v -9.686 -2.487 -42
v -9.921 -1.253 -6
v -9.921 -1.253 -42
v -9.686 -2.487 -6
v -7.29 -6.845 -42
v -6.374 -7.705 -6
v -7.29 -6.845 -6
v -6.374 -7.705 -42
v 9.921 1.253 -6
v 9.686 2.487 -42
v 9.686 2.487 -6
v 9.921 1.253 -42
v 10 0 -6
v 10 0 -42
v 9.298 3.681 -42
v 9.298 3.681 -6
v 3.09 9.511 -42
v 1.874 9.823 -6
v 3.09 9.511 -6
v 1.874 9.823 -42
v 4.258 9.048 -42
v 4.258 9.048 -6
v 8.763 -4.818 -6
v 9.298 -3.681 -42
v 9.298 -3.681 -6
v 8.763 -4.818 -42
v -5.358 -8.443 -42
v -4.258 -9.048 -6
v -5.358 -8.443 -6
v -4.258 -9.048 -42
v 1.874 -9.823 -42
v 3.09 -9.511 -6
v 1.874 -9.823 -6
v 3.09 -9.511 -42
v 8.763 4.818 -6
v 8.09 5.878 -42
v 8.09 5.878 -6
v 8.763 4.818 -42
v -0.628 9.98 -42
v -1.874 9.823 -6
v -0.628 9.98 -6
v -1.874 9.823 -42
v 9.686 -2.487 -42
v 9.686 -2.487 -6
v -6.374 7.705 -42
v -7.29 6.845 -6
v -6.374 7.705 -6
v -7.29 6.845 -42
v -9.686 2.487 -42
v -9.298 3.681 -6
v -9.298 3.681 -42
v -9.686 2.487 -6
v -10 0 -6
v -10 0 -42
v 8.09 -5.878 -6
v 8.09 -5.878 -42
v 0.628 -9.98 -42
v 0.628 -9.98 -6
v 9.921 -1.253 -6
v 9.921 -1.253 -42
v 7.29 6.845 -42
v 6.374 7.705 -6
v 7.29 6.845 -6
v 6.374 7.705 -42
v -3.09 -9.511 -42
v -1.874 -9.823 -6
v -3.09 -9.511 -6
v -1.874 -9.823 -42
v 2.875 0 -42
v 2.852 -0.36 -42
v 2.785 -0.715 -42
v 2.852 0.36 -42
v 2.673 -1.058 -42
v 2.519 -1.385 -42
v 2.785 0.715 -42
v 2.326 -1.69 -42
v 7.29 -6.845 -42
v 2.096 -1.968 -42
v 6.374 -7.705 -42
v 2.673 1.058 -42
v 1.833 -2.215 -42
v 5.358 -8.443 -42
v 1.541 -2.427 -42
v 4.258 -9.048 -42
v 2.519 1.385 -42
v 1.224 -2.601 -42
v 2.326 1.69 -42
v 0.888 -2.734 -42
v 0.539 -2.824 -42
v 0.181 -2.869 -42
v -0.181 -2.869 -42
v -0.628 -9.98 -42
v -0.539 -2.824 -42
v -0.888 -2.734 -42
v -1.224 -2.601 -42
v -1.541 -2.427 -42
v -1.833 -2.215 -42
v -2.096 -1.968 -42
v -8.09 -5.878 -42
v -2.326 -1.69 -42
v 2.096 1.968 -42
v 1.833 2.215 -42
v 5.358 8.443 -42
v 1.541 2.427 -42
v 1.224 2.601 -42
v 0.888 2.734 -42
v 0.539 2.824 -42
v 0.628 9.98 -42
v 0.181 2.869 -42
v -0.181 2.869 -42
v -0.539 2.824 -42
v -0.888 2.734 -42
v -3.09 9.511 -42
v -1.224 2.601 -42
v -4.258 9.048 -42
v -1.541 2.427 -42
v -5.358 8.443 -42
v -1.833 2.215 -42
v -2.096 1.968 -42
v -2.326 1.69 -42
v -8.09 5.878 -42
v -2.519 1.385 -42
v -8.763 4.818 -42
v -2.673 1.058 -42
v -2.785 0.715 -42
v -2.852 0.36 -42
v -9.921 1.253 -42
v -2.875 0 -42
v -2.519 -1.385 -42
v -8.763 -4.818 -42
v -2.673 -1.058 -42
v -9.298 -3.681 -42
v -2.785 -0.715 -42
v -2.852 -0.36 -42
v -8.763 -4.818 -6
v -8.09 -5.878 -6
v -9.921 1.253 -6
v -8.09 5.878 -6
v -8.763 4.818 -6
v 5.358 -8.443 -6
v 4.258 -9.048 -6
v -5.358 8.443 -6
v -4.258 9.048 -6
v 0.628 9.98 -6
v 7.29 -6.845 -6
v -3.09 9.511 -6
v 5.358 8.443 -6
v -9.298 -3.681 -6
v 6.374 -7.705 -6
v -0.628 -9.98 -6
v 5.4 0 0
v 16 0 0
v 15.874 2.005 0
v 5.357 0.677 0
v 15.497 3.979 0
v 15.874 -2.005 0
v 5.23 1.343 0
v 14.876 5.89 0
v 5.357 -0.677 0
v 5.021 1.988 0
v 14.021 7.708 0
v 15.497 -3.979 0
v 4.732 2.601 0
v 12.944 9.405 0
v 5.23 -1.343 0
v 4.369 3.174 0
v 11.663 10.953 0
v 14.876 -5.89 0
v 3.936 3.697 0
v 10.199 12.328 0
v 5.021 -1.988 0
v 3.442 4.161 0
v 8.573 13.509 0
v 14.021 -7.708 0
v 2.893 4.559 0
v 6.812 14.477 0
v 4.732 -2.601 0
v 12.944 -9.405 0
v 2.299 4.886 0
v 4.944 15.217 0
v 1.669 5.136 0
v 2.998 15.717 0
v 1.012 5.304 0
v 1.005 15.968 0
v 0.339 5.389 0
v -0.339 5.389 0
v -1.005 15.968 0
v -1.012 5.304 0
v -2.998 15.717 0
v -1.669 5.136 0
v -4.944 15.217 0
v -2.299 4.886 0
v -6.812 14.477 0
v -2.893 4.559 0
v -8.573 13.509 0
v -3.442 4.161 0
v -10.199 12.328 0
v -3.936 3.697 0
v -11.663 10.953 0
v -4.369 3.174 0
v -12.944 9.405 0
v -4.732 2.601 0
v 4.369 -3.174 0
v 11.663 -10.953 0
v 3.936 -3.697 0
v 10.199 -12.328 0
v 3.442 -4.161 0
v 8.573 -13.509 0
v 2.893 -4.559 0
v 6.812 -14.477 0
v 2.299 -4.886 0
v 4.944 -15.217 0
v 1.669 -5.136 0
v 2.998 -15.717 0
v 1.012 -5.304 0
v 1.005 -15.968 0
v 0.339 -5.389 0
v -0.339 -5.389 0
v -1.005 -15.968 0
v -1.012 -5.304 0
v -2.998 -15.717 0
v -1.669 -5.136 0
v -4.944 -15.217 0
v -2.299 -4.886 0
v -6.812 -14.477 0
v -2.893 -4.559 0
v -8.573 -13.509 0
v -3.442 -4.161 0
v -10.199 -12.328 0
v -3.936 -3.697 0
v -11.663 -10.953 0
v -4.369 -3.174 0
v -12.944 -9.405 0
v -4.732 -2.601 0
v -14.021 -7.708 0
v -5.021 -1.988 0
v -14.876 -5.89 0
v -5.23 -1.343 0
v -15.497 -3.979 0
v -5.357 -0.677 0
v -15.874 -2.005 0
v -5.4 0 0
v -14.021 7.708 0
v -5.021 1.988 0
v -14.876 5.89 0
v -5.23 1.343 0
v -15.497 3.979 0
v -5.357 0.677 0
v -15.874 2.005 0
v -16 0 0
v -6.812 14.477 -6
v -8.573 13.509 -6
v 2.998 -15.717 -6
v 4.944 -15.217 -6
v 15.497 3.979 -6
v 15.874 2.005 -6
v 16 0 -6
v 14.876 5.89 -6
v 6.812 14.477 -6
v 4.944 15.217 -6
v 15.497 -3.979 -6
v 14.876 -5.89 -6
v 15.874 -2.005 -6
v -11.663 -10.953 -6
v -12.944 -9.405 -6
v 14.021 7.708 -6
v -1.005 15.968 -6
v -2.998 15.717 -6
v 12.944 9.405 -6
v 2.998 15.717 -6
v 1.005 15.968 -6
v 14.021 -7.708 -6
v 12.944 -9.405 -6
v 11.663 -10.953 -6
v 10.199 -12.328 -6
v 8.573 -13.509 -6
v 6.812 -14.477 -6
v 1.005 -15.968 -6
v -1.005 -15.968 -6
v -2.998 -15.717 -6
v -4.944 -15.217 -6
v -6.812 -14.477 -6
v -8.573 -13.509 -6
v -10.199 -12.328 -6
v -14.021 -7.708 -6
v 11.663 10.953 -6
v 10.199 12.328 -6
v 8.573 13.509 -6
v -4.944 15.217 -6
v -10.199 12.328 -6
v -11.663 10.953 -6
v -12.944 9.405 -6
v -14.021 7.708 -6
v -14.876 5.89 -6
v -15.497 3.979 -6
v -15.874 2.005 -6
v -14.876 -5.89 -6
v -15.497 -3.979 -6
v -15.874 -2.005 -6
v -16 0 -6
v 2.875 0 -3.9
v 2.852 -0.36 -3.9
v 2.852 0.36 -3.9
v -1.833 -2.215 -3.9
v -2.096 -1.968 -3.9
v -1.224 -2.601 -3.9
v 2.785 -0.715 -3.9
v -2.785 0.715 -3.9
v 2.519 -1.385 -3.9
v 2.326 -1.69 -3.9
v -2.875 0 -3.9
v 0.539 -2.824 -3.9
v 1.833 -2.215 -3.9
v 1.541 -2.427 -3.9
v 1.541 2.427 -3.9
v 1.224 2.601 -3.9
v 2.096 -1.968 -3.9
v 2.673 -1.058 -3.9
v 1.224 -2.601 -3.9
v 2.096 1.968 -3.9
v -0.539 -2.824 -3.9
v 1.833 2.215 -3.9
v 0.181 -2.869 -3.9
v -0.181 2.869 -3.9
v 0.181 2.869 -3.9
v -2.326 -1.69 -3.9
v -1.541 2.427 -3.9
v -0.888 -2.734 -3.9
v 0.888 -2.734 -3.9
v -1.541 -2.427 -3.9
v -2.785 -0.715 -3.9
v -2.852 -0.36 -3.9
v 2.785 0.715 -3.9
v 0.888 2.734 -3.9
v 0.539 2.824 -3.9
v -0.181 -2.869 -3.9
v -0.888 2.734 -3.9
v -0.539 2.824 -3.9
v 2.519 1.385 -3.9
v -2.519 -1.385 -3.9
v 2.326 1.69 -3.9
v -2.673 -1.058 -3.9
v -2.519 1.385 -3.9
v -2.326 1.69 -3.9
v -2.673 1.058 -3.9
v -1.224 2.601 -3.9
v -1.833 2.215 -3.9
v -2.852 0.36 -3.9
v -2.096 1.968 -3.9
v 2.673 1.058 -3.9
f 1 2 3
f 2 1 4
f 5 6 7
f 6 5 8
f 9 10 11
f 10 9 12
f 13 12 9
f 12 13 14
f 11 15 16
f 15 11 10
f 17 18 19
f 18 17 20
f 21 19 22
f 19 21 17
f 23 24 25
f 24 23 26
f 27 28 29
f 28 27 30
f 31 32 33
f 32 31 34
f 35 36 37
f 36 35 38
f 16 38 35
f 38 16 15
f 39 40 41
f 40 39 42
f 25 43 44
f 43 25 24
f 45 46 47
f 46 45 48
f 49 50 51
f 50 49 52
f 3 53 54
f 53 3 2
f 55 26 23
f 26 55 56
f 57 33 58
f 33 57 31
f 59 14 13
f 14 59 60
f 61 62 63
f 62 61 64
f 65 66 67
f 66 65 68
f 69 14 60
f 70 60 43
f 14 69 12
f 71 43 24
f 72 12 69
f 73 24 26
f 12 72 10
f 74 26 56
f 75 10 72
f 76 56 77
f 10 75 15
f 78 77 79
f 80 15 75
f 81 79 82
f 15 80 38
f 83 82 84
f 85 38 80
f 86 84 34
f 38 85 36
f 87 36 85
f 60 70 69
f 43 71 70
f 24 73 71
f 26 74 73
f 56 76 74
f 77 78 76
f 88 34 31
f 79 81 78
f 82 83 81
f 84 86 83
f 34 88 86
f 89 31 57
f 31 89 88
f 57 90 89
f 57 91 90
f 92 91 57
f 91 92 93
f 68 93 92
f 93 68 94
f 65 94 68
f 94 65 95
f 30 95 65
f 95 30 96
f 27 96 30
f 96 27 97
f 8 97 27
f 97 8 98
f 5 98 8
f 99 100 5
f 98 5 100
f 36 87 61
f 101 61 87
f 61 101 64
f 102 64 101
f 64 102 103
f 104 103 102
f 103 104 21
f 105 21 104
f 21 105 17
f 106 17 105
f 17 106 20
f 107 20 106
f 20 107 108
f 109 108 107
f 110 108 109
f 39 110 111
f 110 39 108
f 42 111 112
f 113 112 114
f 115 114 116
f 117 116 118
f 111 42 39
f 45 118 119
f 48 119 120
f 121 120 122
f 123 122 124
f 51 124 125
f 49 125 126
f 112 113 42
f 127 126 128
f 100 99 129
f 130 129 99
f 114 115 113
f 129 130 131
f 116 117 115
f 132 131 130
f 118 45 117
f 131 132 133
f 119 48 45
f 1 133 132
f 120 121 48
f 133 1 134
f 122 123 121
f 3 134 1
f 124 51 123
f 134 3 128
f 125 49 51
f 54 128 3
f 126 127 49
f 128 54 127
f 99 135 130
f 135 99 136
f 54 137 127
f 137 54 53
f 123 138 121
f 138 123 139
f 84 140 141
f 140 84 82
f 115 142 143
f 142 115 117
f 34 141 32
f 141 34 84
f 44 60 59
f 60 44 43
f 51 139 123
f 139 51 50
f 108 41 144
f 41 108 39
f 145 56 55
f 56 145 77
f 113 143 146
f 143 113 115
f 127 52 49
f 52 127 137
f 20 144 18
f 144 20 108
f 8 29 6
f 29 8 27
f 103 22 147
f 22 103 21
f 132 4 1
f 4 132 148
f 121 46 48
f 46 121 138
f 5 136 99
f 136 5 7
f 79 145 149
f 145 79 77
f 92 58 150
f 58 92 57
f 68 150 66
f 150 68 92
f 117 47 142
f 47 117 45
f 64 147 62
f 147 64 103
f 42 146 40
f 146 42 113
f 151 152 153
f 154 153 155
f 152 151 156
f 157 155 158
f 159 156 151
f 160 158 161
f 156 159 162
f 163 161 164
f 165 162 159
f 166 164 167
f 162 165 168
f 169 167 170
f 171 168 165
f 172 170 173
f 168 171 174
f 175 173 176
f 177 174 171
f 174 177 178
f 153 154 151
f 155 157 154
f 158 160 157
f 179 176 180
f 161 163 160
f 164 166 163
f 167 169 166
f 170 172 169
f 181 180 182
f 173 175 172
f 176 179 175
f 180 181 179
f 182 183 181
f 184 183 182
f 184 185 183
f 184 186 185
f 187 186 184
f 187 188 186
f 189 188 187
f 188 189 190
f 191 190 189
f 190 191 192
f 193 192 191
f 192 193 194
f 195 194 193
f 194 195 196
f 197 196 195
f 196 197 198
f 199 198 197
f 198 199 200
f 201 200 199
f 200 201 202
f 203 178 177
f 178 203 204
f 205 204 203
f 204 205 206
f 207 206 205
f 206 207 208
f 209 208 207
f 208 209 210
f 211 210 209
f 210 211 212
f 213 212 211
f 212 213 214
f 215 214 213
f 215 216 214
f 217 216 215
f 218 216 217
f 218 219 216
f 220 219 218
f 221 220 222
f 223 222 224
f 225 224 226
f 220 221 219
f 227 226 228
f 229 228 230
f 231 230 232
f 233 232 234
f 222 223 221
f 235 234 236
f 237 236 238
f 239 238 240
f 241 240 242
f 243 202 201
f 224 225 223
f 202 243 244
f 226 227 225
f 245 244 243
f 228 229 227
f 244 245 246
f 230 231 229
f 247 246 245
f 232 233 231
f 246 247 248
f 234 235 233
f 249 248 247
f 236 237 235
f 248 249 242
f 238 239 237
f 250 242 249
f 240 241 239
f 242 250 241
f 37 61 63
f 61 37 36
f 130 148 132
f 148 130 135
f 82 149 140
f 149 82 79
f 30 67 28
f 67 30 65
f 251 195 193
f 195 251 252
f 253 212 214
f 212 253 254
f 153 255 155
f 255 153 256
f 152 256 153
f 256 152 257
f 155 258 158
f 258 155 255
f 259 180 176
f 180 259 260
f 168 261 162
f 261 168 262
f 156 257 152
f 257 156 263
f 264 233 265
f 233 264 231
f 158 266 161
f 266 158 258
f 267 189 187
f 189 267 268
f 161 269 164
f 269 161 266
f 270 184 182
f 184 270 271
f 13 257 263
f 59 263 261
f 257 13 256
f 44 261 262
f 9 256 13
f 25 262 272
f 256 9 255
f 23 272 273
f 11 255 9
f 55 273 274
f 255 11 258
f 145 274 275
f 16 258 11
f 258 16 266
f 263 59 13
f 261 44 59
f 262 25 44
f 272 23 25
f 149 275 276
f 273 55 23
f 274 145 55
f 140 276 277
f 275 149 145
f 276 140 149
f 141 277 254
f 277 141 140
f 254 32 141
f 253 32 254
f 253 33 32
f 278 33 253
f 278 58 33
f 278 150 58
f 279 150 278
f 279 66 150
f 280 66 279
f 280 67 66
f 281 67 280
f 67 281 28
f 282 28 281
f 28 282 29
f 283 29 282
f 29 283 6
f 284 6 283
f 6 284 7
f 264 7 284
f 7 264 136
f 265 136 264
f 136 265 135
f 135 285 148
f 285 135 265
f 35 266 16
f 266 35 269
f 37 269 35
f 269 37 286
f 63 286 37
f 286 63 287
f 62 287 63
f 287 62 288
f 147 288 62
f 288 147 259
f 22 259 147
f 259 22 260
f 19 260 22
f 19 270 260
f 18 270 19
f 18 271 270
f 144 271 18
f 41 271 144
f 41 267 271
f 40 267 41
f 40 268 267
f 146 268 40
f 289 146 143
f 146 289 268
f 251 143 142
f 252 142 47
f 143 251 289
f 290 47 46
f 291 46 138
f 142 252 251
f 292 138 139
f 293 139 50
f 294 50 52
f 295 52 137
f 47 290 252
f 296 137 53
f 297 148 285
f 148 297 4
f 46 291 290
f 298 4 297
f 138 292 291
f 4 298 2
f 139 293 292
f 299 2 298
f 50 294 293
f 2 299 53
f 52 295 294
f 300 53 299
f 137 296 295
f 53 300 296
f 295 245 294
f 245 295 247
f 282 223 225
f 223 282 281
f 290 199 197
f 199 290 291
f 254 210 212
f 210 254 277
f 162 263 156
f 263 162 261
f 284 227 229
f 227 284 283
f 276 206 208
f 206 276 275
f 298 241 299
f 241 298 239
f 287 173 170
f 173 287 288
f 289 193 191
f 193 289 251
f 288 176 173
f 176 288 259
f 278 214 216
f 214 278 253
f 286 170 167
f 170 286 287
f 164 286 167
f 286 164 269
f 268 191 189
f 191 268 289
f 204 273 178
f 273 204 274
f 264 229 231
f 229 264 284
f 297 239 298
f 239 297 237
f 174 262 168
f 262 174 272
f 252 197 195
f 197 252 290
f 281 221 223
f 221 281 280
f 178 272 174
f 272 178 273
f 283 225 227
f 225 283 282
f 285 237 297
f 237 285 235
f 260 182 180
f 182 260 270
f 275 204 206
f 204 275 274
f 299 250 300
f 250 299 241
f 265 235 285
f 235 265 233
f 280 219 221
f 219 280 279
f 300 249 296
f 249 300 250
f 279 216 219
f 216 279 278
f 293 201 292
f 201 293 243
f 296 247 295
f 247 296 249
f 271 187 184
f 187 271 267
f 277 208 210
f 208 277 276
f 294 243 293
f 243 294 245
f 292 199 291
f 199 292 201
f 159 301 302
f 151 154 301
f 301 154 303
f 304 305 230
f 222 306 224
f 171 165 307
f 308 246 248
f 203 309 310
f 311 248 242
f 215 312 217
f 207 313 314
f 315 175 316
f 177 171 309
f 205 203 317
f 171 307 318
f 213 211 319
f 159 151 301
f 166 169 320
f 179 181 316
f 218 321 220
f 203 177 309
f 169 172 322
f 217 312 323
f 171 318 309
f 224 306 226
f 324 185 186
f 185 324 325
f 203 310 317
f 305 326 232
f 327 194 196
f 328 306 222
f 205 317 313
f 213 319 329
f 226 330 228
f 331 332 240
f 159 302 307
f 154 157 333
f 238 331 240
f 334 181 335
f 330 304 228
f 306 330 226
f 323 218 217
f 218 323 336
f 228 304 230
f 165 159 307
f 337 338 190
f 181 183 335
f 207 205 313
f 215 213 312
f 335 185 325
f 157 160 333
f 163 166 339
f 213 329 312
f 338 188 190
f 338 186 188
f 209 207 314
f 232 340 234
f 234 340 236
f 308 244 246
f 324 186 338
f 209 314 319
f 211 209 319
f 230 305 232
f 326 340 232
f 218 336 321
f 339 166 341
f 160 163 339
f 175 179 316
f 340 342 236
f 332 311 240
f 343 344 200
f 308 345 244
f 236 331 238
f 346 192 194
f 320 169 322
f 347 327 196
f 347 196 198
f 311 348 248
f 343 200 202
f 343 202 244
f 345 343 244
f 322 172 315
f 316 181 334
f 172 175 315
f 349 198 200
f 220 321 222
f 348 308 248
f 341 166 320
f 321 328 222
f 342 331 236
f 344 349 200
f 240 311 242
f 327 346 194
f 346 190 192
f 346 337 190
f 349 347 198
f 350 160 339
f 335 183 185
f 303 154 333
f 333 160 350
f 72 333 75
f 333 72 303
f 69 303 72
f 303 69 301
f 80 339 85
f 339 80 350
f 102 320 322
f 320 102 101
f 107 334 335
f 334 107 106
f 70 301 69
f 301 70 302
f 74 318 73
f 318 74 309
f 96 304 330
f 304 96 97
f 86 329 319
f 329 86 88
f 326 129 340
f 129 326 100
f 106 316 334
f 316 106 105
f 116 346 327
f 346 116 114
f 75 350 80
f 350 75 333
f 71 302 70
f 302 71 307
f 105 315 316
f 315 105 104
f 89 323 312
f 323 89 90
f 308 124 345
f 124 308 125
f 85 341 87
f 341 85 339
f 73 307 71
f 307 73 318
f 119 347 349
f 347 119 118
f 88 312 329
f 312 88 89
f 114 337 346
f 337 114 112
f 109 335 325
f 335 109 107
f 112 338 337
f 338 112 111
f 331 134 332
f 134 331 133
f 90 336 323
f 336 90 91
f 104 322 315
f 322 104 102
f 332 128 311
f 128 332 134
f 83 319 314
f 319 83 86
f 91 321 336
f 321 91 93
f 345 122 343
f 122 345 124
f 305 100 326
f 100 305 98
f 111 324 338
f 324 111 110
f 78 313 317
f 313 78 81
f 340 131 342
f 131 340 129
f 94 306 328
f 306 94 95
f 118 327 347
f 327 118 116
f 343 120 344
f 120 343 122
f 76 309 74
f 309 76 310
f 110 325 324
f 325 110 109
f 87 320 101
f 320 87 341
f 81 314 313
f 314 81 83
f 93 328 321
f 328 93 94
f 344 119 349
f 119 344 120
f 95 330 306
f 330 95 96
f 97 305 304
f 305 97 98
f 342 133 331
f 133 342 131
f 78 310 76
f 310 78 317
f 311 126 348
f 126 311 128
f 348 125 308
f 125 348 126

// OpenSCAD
$fn = 50;


difference() {
	union() {
		translate(v = [0, 0, -42.0000000000]) {
			cylinder(h = 42, r = 10.0000000000);
		}
		translate(v = [0, 0, -6.0000000000]) {
			cylinder(h = 6, r = 16.0000000000);
		}
	}
	union() {
		translate(v = [0, 0, 0]) {
			rotate(a = [0, 0, 0]) {
				difference() {
					union() {
						#translate(v = [0, 0, -42.0000000000]) {
							cylinder(h = 42, r = 2.6000000000);
						}
						#translate(v = [0, 0, -3.9000000000]) {
							cylinder(h = 3.9000000000, r1 = 2.8750000000, r2 = 5.4000000000);
						}
						#translate(v = [0, 0, -42.0000000000]) {
							cylinder(h = 42, r = 2.8750000000);
						}
						#translate(v = [0, 0, -42.0000000000]) {
							cylinder(h = 42, r = 2.6000000000);
						}
					}
					union();
				}
			}
		}
	}
}
